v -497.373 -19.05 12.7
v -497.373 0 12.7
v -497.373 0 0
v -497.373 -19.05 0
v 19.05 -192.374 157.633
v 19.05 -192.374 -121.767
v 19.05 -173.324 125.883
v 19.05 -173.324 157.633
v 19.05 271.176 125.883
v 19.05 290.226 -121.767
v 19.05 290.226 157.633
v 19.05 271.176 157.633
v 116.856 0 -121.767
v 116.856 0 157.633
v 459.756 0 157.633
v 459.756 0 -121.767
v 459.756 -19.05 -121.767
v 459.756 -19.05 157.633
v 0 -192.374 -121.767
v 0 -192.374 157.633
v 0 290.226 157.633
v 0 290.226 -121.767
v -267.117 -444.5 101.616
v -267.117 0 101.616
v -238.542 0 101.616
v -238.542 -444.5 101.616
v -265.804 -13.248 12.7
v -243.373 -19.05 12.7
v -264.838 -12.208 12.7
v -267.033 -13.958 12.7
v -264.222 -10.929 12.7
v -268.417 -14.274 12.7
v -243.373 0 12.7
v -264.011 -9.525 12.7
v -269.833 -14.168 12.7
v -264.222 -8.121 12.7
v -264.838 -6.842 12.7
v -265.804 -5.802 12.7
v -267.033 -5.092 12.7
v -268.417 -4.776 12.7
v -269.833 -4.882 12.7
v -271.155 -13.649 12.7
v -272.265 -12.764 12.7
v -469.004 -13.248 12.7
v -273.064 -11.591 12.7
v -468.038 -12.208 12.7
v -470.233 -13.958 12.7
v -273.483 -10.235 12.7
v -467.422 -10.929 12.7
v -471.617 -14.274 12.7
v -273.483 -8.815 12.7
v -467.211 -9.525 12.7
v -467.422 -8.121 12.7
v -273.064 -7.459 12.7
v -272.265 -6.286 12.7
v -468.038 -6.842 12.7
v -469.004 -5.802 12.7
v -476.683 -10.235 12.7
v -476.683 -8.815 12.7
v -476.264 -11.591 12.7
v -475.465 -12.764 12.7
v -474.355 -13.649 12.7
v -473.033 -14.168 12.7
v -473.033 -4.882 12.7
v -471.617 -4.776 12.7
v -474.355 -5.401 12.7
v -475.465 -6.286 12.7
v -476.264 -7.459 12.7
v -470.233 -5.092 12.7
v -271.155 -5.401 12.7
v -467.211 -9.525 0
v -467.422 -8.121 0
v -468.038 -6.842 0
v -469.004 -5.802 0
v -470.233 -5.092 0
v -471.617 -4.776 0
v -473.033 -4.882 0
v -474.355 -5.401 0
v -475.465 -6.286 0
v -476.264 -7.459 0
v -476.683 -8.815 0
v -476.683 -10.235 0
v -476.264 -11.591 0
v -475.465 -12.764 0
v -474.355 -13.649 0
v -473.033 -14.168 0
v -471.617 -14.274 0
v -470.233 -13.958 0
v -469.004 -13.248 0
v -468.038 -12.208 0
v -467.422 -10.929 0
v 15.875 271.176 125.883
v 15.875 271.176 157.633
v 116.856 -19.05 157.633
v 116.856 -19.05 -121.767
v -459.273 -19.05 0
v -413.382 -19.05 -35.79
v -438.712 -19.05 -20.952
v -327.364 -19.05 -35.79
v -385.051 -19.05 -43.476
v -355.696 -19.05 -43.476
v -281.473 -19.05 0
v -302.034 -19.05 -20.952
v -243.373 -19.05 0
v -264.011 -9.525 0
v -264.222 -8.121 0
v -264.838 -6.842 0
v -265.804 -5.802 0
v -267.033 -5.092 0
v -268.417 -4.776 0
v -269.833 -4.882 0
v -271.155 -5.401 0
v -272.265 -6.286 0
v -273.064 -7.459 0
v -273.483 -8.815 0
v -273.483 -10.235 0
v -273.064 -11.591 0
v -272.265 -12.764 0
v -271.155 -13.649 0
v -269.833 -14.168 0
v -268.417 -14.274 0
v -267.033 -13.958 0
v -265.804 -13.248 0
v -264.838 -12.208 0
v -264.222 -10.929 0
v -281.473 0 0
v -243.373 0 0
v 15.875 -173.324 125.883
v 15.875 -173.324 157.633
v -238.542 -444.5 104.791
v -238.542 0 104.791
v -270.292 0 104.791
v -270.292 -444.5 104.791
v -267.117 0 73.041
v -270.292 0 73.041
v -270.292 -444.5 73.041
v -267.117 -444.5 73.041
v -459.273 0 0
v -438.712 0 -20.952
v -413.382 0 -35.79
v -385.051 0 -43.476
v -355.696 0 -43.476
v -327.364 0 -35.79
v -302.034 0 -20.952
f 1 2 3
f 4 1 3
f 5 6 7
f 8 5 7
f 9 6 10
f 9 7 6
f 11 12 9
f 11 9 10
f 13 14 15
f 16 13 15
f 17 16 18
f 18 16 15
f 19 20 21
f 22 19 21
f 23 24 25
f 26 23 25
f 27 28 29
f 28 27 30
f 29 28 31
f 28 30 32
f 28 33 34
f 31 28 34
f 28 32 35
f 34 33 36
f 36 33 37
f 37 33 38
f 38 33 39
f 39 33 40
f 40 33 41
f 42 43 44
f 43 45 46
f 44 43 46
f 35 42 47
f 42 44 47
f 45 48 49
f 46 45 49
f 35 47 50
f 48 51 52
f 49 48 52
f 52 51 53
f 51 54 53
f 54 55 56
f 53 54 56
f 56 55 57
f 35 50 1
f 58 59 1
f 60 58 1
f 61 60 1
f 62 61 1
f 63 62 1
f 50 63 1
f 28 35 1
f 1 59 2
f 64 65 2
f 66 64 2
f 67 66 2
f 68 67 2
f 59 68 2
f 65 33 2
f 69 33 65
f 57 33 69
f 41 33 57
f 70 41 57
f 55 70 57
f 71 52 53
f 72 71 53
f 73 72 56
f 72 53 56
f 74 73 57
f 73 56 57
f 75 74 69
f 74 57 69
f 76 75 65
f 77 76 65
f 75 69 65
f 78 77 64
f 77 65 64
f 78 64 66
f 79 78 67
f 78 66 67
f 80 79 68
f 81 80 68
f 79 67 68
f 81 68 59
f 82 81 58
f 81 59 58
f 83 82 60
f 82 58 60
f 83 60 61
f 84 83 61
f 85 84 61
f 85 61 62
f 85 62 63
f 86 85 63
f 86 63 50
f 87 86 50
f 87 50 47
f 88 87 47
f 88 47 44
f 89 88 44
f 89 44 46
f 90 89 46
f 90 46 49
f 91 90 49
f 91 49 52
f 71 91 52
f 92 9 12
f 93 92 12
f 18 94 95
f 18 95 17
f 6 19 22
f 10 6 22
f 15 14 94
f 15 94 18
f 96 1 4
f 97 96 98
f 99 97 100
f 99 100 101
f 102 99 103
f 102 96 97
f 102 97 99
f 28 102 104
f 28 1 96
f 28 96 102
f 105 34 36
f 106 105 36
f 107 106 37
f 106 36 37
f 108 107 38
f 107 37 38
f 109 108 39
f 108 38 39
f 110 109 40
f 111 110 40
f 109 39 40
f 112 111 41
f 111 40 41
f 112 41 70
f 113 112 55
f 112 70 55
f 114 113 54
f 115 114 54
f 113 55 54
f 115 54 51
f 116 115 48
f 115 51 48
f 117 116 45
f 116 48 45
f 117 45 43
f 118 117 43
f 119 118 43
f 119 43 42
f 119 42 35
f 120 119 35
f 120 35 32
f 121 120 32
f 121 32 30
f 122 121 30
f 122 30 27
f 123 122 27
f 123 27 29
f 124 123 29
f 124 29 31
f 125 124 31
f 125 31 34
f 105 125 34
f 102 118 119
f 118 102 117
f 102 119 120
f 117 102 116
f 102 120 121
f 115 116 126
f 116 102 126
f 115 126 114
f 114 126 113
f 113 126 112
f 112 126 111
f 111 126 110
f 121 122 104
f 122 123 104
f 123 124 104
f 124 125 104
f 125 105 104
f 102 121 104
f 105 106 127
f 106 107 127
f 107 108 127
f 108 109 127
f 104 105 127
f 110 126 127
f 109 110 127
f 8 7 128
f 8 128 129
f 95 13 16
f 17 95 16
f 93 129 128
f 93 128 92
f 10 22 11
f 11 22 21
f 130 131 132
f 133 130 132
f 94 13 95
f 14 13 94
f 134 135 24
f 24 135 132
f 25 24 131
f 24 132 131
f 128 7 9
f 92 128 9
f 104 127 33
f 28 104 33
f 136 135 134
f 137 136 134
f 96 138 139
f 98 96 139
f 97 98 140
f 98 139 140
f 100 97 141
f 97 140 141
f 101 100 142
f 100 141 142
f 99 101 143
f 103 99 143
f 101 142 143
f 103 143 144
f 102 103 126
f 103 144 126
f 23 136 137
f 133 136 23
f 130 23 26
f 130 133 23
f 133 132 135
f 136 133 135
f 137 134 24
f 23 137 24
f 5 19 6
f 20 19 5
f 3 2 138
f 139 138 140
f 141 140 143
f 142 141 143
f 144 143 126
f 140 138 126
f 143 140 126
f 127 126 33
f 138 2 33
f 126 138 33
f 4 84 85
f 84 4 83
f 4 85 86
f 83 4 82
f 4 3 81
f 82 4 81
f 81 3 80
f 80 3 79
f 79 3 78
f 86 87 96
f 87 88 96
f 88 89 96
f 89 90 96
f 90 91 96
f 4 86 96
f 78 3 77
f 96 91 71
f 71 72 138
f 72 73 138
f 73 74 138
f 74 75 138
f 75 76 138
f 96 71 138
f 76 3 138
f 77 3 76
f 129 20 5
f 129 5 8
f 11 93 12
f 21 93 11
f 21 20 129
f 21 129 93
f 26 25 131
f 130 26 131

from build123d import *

# Parameters (mm, degrees)
F0_W      = 482.6
F0_H      = 279.4
F1_DEPTH  = 19.05
F2_W      = 342.9
F2_H      = 279.4
F3_DEPTH  = 19.05
F5_DEPTH  = 444.5
F6_W      = 444.5
F6_H      = 31.75
F7_DEPTH  = 3.175
F9_DEPTH  = 19.05
F10_R     = 4.7625
F11_DEPTH = 134.467782


with BuildPart() as f1:
    # F0 (on Right) → F1 (new body)
    with BuildSketch(Plane.YZ):
        with Locations((48.92646, 17.933218)):
            Rectangle(F0_W, F0_H)
    extrude(amount=F1_DEPTH)

    # F6 (on face) → F7 (cut)
    with BuildSketch(Plane.YZ.offset(19.05)):
        with Locations((48.92646, 141.758218)):
            Rectangle(F6_W, F6_H)
    extrude(amount=-F7_DEPTH, mode=Mode.SUBTRACT)


with BuildPart() as f3:
    # F2 (on Front) → F3 (new body)
    with BuildSketch(Plane.XZ):
        with Locations((288.305782, 17.933218)):
            Rectangle(F2_W, F2_H)
    extrude(amount=F3_DEPTH)


with BuildPart() as f5:
    # F4 (on Front) → F5 (new body)
    with BuildSketch(Plane.XZ):
        Polygon((-270.291884, 73.041052), (-267.116884, 73.041052), (-267.116884, 101.616052), (-238.541884, 101.616052), (-238.541884, 104.791052), (-270.291884, 104.791052), align=None)
    extrude(amount=F5_DEPTH)


with BuildPart() as f9:
    # F8 (on Front) → F9 (new body)
    with BuildSketch(Plane.XZ):
        with BuildLine():
            Line((-243.373358, 12.7), (-497.373358, 12.7))
            Line((-497.373358, 12.7), (-497.373358, 0))
            Line((-497.373358, 0), (-459.273358, 0))
            ThreePointArc((-459.273358, 0), (-370.373358, -44.45), (-281.473358, 0))
            Line((-281.473358, 0), (-243.373358, 0))
            Line((-243.373358, 0), (-243.373358, 12.7))
        make_face()
    extrude(amount=F9_DEPTH)

    # F10 (on face) → F11 (cut, through all)
    with BuildSketch(Plane.XY.offset(12.7)):
        with Locations((-471.973358, -9.525)):
            Circle(F10_R)
        with Locations((-268.773358, -9.525)):
            Circle(F10_R)
    extrude(amount=-F11_DEPTH, mode=Mode.SUBTRACT)


solid = Compound([f1.part, f3.part, f5.part, f9.part])
